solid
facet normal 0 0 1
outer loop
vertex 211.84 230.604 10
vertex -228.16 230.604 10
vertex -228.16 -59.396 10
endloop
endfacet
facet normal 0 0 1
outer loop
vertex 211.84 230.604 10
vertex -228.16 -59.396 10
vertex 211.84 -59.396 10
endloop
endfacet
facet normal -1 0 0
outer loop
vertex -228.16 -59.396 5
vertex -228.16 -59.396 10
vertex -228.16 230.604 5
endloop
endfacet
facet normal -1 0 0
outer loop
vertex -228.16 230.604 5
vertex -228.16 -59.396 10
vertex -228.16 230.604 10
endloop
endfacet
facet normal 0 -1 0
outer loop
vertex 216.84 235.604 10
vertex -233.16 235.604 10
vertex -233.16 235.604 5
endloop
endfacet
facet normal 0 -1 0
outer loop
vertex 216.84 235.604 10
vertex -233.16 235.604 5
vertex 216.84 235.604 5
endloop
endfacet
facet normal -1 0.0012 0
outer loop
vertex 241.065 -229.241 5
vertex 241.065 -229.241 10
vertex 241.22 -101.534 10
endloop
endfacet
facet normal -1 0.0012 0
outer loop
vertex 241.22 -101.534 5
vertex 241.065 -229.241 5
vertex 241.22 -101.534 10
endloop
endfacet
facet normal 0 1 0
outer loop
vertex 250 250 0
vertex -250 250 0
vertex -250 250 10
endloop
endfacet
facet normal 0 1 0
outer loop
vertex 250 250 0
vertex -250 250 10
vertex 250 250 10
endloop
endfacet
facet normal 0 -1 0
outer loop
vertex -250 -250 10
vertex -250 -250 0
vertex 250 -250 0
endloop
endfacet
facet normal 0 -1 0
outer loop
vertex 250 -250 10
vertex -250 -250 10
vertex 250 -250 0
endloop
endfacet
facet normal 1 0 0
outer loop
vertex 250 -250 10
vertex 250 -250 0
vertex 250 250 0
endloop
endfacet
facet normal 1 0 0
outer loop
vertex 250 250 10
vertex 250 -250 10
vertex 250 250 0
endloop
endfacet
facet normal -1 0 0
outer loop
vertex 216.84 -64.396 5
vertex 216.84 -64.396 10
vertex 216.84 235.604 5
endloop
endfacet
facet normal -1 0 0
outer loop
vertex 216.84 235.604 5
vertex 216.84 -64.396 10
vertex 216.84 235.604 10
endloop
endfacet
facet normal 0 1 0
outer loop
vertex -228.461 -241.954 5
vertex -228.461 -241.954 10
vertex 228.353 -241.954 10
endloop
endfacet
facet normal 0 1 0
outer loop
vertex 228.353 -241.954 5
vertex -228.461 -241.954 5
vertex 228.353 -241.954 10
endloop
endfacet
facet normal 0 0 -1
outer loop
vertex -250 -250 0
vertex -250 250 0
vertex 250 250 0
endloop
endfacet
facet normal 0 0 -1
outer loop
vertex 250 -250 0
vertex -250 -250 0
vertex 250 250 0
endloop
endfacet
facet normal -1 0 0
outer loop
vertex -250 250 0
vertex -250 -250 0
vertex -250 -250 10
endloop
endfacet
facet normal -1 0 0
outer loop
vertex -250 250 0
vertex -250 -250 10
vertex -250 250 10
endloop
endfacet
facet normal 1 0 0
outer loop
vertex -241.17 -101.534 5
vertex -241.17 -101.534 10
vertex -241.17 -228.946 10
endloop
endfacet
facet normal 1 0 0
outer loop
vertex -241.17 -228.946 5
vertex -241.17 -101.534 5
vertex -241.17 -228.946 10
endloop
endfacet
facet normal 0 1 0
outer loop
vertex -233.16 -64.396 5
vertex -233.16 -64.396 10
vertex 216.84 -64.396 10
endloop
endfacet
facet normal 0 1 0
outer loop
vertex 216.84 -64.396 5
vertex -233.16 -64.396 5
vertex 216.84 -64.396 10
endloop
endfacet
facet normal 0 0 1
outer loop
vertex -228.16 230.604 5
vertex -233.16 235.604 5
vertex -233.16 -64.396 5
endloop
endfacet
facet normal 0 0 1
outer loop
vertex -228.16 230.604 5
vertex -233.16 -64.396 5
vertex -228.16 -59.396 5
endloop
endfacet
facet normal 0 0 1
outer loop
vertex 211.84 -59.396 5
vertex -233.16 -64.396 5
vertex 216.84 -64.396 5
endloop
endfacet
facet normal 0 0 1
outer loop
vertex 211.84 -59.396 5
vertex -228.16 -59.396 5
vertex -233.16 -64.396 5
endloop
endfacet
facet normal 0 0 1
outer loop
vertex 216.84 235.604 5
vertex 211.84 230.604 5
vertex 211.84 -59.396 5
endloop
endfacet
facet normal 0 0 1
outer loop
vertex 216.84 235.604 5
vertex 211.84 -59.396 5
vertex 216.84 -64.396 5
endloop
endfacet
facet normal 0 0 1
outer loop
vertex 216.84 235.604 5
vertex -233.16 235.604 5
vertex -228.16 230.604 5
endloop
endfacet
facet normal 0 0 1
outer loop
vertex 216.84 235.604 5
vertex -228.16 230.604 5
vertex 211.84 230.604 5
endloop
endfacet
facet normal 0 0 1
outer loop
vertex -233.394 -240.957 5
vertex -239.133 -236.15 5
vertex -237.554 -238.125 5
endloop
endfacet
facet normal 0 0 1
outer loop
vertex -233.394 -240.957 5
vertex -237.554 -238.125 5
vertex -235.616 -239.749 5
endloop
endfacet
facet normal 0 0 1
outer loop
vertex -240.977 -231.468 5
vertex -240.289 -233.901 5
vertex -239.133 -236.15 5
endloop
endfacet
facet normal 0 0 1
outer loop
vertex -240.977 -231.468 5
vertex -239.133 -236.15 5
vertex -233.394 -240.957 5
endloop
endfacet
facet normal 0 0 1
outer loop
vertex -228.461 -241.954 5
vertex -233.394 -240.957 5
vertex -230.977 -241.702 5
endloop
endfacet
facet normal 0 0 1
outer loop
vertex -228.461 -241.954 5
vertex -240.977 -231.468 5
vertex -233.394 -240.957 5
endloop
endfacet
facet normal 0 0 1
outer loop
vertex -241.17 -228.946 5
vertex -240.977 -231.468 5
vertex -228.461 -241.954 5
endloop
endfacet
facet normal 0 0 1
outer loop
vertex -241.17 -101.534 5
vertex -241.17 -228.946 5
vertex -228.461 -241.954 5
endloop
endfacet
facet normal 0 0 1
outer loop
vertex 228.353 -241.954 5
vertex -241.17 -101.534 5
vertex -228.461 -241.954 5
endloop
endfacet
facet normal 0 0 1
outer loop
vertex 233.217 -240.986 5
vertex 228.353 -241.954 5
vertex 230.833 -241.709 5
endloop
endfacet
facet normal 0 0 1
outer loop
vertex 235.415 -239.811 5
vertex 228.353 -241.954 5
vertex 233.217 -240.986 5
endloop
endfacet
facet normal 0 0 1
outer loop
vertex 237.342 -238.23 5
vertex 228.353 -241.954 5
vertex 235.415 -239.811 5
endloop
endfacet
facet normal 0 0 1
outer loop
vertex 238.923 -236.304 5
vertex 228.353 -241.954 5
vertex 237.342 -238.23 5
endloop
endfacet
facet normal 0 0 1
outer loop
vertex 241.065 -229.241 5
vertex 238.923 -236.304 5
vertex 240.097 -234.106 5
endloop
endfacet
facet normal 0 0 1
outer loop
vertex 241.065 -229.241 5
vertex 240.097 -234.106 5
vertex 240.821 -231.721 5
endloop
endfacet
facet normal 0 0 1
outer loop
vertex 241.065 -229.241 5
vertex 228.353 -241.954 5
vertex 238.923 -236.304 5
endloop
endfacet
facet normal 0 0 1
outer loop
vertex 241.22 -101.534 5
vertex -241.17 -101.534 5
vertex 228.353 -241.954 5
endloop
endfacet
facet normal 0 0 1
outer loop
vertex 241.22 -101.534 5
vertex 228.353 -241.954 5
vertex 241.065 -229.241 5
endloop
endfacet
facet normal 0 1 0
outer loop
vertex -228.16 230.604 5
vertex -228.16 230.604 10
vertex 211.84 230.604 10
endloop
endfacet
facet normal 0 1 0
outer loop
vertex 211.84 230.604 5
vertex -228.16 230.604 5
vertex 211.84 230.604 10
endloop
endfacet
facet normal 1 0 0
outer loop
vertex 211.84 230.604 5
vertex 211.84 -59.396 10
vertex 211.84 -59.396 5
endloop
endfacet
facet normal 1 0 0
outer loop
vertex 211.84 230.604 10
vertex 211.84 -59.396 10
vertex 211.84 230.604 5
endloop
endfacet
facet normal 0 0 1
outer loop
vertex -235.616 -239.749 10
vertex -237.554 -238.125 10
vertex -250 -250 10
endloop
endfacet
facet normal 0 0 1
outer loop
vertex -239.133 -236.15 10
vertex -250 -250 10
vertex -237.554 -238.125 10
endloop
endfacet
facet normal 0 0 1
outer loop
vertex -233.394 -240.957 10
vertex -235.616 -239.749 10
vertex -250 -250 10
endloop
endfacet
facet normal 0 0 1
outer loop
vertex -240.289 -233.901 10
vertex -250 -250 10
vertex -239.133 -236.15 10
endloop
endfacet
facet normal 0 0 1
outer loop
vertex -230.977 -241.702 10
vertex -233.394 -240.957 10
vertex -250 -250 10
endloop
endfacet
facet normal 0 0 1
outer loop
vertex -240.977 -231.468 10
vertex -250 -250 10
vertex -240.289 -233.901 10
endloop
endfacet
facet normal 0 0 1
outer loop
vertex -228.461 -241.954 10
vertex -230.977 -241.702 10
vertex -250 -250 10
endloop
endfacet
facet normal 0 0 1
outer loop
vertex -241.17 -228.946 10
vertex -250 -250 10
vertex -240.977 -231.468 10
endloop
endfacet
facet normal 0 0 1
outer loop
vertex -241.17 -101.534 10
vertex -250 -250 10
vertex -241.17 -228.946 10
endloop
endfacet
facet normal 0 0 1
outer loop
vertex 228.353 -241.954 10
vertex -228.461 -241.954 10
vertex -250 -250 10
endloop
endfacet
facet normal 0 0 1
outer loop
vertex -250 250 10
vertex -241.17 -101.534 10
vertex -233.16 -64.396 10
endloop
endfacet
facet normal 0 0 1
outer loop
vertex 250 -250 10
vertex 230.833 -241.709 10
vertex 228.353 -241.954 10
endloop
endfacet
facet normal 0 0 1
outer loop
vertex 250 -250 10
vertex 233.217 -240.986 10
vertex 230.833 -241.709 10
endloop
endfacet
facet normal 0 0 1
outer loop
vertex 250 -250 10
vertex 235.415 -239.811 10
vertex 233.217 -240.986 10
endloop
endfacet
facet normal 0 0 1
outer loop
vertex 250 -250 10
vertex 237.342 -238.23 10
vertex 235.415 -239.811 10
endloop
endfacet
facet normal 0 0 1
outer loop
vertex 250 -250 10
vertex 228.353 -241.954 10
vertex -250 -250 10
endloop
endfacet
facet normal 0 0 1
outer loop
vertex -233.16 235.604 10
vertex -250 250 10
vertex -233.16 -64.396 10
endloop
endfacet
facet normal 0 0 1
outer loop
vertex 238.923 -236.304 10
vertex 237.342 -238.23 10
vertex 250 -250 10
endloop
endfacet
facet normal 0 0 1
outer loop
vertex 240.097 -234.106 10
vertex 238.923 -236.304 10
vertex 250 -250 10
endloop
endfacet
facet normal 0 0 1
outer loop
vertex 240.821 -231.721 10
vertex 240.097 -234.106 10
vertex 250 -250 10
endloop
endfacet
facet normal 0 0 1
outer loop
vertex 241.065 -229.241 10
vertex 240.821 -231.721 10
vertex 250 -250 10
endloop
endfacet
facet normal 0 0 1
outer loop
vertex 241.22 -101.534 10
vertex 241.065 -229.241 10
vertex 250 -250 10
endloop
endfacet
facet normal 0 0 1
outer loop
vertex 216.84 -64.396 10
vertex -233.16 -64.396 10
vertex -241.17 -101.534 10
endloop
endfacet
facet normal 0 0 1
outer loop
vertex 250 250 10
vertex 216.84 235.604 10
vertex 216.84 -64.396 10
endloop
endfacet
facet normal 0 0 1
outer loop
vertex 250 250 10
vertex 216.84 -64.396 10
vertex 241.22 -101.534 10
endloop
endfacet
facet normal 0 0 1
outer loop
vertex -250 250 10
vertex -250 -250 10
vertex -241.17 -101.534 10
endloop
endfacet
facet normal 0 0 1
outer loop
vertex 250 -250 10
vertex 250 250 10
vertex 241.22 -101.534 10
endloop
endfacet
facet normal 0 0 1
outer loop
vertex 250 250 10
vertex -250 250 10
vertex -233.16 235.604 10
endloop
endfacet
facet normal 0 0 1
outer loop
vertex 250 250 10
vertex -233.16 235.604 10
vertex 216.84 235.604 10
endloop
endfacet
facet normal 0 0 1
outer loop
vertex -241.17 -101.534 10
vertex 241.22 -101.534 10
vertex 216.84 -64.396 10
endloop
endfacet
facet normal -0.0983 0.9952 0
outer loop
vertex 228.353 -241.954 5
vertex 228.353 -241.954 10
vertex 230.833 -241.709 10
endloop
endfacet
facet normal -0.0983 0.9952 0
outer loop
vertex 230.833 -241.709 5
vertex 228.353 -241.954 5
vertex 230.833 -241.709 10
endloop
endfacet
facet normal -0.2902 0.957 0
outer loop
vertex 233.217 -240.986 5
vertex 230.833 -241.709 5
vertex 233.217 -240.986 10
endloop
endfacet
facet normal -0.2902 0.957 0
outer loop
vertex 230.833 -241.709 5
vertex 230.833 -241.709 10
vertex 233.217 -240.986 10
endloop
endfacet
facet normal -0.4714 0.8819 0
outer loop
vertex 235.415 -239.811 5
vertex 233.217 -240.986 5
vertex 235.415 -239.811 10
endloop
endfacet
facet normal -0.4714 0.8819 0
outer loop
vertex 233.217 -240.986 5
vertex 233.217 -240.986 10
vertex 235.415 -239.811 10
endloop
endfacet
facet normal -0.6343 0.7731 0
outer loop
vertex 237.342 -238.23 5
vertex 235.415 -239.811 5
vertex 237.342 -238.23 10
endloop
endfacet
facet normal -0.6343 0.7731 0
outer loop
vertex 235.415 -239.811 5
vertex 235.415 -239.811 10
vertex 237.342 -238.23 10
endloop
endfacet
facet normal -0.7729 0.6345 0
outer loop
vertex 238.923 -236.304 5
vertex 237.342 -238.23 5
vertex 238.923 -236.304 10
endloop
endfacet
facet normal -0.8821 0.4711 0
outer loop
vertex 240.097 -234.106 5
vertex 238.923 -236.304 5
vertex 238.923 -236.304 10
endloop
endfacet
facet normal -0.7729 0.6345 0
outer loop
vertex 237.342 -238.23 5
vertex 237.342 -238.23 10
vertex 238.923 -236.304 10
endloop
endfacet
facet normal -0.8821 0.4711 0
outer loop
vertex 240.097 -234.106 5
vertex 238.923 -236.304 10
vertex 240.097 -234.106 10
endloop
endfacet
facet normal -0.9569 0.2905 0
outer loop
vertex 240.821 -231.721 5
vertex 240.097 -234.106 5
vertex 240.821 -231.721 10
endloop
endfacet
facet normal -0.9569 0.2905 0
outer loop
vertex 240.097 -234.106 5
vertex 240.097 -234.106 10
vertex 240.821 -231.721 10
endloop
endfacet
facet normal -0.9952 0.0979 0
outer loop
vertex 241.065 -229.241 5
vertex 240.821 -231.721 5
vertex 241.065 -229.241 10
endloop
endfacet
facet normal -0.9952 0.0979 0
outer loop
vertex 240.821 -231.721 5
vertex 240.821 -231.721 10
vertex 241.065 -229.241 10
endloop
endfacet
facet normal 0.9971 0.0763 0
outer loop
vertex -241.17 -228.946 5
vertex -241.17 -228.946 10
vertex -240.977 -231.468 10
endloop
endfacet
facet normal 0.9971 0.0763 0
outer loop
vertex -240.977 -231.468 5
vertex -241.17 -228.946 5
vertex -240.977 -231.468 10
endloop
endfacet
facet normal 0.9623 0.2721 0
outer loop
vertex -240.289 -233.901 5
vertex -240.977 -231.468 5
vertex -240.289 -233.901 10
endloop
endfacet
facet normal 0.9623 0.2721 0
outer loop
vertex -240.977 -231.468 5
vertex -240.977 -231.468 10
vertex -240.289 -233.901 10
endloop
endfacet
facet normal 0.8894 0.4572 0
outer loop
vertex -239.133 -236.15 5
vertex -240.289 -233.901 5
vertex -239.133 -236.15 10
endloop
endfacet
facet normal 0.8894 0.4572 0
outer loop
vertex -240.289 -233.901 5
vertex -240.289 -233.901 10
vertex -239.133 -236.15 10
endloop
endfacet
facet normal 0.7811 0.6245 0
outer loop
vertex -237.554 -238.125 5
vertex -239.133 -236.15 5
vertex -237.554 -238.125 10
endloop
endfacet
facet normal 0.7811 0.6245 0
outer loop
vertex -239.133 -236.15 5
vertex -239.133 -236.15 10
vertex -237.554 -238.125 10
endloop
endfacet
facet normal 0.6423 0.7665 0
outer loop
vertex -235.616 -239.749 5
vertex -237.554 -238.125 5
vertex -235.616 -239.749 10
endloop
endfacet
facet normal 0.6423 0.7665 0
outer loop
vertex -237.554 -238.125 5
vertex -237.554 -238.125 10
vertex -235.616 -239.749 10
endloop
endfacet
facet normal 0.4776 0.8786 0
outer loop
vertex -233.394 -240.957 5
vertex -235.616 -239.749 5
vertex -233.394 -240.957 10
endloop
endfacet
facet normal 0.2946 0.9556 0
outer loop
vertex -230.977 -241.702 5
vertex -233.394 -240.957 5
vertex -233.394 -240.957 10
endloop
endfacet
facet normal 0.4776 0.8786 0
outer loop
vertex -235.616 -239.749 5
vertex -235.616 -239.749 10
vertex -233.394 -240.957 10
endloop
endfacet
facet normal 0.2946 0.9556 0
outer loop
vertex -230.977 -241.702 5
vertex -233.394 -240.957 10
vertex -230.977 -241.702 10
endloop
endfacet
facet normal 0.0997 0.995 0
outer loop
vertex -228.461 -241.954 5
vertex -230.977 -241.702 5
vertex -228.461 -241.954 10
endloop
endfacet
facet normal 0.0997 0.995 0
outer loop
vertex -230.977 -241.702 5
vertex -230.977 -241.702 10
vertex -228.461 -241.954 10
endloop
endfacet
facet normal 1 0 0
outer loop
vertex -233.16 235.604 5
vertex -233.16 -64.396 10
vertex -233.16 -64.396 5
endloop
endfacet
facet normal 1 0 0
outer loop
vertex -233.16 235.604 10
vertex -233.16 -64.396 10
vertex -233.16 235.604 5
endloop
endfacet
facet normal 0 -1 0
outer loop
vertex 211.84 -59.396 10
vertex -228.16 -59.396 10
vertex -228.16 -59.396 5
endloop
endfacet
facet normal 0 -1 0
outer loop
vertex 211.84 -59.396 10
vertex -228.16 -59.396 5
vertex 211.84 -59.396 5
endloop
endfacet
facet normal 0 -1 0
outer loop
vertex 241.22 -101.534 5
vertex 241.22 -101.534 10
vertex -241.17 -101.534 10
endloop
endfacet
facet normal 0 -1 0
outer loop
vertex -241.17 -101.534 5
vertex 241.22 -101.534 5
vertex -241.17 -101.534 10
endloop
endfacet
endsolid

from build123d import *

# Parameters (mm, degrees)
SKETCH2_W           = 500
SKETCH2_H           = 500
BOSS_EXTRUDE1_DEPTH = 10
CUT_EXTRUDE1_DEPTH  = 5
SKETCH5_W           = 450
SKETCH5_H           = 300
SKETCH5_W_2         = 440
SKETCH5_H_2         = 290
CUT_EXTRUDE2_DEPTH  = 5


with BuildPart() as part:
    # Sketch2 → Boss-Extrude1 (new body)
    with BuildSketch(Plane.XY):
        Rectangle(SKETCH2_W, SKETCH2_H)
    extrude(amount=BOSS_EXTRUDE1_DEPTH)

    # Sketch4 → Cut-Extrude1 (cut)
    with BuildSketch(Plane.XY.offset(10)):
        with BuildLine():
            Line((241.065145693, -229.240987046), (241.219730906, -101.53377405))
            Line((241.219730906, -101.53377405), (-241.170400919, -101.53377405))
            Line((-241.170400919, -101.53377405), (-241.170400919, -228.946326042))
            ThreePointArc((-241.170400919, -228.946326042), (-237.553979354, -238.125325488), (-228.461270123, -241.953533239))
            Line((-228.461270123, -241.953533239), (228.3525995, -241.953533239))
            ThreePointArc((228.3525995, -241.953533239), (237.341727119, -238.230114666), (241.065145693, -229.240987046))
        make_face()
    extrude(amount=-CUT_EXTRUDE1_DEPTH, mode=Mode.SUBTRACT)

    # Sketch5 → Cut-Extrude2 (cut)
    with BuildSketch(Plane.XY.offset(10)):
        with Locations((-8.159820112, 85.603894722)):
            Rectangle(SKETCH5_W, SKETCH5_H)
        with Locations((-8.159820112, 85.603894722)):
            Rectangle(SKETCH5_W_2, SKETCH5_H_2, mode=Mode.SUBTRACT)
    extrude(amount=-CUT_EXTRUDE2_DEPTH, mode=Mode.SUBTRACT)


solid = part.part
